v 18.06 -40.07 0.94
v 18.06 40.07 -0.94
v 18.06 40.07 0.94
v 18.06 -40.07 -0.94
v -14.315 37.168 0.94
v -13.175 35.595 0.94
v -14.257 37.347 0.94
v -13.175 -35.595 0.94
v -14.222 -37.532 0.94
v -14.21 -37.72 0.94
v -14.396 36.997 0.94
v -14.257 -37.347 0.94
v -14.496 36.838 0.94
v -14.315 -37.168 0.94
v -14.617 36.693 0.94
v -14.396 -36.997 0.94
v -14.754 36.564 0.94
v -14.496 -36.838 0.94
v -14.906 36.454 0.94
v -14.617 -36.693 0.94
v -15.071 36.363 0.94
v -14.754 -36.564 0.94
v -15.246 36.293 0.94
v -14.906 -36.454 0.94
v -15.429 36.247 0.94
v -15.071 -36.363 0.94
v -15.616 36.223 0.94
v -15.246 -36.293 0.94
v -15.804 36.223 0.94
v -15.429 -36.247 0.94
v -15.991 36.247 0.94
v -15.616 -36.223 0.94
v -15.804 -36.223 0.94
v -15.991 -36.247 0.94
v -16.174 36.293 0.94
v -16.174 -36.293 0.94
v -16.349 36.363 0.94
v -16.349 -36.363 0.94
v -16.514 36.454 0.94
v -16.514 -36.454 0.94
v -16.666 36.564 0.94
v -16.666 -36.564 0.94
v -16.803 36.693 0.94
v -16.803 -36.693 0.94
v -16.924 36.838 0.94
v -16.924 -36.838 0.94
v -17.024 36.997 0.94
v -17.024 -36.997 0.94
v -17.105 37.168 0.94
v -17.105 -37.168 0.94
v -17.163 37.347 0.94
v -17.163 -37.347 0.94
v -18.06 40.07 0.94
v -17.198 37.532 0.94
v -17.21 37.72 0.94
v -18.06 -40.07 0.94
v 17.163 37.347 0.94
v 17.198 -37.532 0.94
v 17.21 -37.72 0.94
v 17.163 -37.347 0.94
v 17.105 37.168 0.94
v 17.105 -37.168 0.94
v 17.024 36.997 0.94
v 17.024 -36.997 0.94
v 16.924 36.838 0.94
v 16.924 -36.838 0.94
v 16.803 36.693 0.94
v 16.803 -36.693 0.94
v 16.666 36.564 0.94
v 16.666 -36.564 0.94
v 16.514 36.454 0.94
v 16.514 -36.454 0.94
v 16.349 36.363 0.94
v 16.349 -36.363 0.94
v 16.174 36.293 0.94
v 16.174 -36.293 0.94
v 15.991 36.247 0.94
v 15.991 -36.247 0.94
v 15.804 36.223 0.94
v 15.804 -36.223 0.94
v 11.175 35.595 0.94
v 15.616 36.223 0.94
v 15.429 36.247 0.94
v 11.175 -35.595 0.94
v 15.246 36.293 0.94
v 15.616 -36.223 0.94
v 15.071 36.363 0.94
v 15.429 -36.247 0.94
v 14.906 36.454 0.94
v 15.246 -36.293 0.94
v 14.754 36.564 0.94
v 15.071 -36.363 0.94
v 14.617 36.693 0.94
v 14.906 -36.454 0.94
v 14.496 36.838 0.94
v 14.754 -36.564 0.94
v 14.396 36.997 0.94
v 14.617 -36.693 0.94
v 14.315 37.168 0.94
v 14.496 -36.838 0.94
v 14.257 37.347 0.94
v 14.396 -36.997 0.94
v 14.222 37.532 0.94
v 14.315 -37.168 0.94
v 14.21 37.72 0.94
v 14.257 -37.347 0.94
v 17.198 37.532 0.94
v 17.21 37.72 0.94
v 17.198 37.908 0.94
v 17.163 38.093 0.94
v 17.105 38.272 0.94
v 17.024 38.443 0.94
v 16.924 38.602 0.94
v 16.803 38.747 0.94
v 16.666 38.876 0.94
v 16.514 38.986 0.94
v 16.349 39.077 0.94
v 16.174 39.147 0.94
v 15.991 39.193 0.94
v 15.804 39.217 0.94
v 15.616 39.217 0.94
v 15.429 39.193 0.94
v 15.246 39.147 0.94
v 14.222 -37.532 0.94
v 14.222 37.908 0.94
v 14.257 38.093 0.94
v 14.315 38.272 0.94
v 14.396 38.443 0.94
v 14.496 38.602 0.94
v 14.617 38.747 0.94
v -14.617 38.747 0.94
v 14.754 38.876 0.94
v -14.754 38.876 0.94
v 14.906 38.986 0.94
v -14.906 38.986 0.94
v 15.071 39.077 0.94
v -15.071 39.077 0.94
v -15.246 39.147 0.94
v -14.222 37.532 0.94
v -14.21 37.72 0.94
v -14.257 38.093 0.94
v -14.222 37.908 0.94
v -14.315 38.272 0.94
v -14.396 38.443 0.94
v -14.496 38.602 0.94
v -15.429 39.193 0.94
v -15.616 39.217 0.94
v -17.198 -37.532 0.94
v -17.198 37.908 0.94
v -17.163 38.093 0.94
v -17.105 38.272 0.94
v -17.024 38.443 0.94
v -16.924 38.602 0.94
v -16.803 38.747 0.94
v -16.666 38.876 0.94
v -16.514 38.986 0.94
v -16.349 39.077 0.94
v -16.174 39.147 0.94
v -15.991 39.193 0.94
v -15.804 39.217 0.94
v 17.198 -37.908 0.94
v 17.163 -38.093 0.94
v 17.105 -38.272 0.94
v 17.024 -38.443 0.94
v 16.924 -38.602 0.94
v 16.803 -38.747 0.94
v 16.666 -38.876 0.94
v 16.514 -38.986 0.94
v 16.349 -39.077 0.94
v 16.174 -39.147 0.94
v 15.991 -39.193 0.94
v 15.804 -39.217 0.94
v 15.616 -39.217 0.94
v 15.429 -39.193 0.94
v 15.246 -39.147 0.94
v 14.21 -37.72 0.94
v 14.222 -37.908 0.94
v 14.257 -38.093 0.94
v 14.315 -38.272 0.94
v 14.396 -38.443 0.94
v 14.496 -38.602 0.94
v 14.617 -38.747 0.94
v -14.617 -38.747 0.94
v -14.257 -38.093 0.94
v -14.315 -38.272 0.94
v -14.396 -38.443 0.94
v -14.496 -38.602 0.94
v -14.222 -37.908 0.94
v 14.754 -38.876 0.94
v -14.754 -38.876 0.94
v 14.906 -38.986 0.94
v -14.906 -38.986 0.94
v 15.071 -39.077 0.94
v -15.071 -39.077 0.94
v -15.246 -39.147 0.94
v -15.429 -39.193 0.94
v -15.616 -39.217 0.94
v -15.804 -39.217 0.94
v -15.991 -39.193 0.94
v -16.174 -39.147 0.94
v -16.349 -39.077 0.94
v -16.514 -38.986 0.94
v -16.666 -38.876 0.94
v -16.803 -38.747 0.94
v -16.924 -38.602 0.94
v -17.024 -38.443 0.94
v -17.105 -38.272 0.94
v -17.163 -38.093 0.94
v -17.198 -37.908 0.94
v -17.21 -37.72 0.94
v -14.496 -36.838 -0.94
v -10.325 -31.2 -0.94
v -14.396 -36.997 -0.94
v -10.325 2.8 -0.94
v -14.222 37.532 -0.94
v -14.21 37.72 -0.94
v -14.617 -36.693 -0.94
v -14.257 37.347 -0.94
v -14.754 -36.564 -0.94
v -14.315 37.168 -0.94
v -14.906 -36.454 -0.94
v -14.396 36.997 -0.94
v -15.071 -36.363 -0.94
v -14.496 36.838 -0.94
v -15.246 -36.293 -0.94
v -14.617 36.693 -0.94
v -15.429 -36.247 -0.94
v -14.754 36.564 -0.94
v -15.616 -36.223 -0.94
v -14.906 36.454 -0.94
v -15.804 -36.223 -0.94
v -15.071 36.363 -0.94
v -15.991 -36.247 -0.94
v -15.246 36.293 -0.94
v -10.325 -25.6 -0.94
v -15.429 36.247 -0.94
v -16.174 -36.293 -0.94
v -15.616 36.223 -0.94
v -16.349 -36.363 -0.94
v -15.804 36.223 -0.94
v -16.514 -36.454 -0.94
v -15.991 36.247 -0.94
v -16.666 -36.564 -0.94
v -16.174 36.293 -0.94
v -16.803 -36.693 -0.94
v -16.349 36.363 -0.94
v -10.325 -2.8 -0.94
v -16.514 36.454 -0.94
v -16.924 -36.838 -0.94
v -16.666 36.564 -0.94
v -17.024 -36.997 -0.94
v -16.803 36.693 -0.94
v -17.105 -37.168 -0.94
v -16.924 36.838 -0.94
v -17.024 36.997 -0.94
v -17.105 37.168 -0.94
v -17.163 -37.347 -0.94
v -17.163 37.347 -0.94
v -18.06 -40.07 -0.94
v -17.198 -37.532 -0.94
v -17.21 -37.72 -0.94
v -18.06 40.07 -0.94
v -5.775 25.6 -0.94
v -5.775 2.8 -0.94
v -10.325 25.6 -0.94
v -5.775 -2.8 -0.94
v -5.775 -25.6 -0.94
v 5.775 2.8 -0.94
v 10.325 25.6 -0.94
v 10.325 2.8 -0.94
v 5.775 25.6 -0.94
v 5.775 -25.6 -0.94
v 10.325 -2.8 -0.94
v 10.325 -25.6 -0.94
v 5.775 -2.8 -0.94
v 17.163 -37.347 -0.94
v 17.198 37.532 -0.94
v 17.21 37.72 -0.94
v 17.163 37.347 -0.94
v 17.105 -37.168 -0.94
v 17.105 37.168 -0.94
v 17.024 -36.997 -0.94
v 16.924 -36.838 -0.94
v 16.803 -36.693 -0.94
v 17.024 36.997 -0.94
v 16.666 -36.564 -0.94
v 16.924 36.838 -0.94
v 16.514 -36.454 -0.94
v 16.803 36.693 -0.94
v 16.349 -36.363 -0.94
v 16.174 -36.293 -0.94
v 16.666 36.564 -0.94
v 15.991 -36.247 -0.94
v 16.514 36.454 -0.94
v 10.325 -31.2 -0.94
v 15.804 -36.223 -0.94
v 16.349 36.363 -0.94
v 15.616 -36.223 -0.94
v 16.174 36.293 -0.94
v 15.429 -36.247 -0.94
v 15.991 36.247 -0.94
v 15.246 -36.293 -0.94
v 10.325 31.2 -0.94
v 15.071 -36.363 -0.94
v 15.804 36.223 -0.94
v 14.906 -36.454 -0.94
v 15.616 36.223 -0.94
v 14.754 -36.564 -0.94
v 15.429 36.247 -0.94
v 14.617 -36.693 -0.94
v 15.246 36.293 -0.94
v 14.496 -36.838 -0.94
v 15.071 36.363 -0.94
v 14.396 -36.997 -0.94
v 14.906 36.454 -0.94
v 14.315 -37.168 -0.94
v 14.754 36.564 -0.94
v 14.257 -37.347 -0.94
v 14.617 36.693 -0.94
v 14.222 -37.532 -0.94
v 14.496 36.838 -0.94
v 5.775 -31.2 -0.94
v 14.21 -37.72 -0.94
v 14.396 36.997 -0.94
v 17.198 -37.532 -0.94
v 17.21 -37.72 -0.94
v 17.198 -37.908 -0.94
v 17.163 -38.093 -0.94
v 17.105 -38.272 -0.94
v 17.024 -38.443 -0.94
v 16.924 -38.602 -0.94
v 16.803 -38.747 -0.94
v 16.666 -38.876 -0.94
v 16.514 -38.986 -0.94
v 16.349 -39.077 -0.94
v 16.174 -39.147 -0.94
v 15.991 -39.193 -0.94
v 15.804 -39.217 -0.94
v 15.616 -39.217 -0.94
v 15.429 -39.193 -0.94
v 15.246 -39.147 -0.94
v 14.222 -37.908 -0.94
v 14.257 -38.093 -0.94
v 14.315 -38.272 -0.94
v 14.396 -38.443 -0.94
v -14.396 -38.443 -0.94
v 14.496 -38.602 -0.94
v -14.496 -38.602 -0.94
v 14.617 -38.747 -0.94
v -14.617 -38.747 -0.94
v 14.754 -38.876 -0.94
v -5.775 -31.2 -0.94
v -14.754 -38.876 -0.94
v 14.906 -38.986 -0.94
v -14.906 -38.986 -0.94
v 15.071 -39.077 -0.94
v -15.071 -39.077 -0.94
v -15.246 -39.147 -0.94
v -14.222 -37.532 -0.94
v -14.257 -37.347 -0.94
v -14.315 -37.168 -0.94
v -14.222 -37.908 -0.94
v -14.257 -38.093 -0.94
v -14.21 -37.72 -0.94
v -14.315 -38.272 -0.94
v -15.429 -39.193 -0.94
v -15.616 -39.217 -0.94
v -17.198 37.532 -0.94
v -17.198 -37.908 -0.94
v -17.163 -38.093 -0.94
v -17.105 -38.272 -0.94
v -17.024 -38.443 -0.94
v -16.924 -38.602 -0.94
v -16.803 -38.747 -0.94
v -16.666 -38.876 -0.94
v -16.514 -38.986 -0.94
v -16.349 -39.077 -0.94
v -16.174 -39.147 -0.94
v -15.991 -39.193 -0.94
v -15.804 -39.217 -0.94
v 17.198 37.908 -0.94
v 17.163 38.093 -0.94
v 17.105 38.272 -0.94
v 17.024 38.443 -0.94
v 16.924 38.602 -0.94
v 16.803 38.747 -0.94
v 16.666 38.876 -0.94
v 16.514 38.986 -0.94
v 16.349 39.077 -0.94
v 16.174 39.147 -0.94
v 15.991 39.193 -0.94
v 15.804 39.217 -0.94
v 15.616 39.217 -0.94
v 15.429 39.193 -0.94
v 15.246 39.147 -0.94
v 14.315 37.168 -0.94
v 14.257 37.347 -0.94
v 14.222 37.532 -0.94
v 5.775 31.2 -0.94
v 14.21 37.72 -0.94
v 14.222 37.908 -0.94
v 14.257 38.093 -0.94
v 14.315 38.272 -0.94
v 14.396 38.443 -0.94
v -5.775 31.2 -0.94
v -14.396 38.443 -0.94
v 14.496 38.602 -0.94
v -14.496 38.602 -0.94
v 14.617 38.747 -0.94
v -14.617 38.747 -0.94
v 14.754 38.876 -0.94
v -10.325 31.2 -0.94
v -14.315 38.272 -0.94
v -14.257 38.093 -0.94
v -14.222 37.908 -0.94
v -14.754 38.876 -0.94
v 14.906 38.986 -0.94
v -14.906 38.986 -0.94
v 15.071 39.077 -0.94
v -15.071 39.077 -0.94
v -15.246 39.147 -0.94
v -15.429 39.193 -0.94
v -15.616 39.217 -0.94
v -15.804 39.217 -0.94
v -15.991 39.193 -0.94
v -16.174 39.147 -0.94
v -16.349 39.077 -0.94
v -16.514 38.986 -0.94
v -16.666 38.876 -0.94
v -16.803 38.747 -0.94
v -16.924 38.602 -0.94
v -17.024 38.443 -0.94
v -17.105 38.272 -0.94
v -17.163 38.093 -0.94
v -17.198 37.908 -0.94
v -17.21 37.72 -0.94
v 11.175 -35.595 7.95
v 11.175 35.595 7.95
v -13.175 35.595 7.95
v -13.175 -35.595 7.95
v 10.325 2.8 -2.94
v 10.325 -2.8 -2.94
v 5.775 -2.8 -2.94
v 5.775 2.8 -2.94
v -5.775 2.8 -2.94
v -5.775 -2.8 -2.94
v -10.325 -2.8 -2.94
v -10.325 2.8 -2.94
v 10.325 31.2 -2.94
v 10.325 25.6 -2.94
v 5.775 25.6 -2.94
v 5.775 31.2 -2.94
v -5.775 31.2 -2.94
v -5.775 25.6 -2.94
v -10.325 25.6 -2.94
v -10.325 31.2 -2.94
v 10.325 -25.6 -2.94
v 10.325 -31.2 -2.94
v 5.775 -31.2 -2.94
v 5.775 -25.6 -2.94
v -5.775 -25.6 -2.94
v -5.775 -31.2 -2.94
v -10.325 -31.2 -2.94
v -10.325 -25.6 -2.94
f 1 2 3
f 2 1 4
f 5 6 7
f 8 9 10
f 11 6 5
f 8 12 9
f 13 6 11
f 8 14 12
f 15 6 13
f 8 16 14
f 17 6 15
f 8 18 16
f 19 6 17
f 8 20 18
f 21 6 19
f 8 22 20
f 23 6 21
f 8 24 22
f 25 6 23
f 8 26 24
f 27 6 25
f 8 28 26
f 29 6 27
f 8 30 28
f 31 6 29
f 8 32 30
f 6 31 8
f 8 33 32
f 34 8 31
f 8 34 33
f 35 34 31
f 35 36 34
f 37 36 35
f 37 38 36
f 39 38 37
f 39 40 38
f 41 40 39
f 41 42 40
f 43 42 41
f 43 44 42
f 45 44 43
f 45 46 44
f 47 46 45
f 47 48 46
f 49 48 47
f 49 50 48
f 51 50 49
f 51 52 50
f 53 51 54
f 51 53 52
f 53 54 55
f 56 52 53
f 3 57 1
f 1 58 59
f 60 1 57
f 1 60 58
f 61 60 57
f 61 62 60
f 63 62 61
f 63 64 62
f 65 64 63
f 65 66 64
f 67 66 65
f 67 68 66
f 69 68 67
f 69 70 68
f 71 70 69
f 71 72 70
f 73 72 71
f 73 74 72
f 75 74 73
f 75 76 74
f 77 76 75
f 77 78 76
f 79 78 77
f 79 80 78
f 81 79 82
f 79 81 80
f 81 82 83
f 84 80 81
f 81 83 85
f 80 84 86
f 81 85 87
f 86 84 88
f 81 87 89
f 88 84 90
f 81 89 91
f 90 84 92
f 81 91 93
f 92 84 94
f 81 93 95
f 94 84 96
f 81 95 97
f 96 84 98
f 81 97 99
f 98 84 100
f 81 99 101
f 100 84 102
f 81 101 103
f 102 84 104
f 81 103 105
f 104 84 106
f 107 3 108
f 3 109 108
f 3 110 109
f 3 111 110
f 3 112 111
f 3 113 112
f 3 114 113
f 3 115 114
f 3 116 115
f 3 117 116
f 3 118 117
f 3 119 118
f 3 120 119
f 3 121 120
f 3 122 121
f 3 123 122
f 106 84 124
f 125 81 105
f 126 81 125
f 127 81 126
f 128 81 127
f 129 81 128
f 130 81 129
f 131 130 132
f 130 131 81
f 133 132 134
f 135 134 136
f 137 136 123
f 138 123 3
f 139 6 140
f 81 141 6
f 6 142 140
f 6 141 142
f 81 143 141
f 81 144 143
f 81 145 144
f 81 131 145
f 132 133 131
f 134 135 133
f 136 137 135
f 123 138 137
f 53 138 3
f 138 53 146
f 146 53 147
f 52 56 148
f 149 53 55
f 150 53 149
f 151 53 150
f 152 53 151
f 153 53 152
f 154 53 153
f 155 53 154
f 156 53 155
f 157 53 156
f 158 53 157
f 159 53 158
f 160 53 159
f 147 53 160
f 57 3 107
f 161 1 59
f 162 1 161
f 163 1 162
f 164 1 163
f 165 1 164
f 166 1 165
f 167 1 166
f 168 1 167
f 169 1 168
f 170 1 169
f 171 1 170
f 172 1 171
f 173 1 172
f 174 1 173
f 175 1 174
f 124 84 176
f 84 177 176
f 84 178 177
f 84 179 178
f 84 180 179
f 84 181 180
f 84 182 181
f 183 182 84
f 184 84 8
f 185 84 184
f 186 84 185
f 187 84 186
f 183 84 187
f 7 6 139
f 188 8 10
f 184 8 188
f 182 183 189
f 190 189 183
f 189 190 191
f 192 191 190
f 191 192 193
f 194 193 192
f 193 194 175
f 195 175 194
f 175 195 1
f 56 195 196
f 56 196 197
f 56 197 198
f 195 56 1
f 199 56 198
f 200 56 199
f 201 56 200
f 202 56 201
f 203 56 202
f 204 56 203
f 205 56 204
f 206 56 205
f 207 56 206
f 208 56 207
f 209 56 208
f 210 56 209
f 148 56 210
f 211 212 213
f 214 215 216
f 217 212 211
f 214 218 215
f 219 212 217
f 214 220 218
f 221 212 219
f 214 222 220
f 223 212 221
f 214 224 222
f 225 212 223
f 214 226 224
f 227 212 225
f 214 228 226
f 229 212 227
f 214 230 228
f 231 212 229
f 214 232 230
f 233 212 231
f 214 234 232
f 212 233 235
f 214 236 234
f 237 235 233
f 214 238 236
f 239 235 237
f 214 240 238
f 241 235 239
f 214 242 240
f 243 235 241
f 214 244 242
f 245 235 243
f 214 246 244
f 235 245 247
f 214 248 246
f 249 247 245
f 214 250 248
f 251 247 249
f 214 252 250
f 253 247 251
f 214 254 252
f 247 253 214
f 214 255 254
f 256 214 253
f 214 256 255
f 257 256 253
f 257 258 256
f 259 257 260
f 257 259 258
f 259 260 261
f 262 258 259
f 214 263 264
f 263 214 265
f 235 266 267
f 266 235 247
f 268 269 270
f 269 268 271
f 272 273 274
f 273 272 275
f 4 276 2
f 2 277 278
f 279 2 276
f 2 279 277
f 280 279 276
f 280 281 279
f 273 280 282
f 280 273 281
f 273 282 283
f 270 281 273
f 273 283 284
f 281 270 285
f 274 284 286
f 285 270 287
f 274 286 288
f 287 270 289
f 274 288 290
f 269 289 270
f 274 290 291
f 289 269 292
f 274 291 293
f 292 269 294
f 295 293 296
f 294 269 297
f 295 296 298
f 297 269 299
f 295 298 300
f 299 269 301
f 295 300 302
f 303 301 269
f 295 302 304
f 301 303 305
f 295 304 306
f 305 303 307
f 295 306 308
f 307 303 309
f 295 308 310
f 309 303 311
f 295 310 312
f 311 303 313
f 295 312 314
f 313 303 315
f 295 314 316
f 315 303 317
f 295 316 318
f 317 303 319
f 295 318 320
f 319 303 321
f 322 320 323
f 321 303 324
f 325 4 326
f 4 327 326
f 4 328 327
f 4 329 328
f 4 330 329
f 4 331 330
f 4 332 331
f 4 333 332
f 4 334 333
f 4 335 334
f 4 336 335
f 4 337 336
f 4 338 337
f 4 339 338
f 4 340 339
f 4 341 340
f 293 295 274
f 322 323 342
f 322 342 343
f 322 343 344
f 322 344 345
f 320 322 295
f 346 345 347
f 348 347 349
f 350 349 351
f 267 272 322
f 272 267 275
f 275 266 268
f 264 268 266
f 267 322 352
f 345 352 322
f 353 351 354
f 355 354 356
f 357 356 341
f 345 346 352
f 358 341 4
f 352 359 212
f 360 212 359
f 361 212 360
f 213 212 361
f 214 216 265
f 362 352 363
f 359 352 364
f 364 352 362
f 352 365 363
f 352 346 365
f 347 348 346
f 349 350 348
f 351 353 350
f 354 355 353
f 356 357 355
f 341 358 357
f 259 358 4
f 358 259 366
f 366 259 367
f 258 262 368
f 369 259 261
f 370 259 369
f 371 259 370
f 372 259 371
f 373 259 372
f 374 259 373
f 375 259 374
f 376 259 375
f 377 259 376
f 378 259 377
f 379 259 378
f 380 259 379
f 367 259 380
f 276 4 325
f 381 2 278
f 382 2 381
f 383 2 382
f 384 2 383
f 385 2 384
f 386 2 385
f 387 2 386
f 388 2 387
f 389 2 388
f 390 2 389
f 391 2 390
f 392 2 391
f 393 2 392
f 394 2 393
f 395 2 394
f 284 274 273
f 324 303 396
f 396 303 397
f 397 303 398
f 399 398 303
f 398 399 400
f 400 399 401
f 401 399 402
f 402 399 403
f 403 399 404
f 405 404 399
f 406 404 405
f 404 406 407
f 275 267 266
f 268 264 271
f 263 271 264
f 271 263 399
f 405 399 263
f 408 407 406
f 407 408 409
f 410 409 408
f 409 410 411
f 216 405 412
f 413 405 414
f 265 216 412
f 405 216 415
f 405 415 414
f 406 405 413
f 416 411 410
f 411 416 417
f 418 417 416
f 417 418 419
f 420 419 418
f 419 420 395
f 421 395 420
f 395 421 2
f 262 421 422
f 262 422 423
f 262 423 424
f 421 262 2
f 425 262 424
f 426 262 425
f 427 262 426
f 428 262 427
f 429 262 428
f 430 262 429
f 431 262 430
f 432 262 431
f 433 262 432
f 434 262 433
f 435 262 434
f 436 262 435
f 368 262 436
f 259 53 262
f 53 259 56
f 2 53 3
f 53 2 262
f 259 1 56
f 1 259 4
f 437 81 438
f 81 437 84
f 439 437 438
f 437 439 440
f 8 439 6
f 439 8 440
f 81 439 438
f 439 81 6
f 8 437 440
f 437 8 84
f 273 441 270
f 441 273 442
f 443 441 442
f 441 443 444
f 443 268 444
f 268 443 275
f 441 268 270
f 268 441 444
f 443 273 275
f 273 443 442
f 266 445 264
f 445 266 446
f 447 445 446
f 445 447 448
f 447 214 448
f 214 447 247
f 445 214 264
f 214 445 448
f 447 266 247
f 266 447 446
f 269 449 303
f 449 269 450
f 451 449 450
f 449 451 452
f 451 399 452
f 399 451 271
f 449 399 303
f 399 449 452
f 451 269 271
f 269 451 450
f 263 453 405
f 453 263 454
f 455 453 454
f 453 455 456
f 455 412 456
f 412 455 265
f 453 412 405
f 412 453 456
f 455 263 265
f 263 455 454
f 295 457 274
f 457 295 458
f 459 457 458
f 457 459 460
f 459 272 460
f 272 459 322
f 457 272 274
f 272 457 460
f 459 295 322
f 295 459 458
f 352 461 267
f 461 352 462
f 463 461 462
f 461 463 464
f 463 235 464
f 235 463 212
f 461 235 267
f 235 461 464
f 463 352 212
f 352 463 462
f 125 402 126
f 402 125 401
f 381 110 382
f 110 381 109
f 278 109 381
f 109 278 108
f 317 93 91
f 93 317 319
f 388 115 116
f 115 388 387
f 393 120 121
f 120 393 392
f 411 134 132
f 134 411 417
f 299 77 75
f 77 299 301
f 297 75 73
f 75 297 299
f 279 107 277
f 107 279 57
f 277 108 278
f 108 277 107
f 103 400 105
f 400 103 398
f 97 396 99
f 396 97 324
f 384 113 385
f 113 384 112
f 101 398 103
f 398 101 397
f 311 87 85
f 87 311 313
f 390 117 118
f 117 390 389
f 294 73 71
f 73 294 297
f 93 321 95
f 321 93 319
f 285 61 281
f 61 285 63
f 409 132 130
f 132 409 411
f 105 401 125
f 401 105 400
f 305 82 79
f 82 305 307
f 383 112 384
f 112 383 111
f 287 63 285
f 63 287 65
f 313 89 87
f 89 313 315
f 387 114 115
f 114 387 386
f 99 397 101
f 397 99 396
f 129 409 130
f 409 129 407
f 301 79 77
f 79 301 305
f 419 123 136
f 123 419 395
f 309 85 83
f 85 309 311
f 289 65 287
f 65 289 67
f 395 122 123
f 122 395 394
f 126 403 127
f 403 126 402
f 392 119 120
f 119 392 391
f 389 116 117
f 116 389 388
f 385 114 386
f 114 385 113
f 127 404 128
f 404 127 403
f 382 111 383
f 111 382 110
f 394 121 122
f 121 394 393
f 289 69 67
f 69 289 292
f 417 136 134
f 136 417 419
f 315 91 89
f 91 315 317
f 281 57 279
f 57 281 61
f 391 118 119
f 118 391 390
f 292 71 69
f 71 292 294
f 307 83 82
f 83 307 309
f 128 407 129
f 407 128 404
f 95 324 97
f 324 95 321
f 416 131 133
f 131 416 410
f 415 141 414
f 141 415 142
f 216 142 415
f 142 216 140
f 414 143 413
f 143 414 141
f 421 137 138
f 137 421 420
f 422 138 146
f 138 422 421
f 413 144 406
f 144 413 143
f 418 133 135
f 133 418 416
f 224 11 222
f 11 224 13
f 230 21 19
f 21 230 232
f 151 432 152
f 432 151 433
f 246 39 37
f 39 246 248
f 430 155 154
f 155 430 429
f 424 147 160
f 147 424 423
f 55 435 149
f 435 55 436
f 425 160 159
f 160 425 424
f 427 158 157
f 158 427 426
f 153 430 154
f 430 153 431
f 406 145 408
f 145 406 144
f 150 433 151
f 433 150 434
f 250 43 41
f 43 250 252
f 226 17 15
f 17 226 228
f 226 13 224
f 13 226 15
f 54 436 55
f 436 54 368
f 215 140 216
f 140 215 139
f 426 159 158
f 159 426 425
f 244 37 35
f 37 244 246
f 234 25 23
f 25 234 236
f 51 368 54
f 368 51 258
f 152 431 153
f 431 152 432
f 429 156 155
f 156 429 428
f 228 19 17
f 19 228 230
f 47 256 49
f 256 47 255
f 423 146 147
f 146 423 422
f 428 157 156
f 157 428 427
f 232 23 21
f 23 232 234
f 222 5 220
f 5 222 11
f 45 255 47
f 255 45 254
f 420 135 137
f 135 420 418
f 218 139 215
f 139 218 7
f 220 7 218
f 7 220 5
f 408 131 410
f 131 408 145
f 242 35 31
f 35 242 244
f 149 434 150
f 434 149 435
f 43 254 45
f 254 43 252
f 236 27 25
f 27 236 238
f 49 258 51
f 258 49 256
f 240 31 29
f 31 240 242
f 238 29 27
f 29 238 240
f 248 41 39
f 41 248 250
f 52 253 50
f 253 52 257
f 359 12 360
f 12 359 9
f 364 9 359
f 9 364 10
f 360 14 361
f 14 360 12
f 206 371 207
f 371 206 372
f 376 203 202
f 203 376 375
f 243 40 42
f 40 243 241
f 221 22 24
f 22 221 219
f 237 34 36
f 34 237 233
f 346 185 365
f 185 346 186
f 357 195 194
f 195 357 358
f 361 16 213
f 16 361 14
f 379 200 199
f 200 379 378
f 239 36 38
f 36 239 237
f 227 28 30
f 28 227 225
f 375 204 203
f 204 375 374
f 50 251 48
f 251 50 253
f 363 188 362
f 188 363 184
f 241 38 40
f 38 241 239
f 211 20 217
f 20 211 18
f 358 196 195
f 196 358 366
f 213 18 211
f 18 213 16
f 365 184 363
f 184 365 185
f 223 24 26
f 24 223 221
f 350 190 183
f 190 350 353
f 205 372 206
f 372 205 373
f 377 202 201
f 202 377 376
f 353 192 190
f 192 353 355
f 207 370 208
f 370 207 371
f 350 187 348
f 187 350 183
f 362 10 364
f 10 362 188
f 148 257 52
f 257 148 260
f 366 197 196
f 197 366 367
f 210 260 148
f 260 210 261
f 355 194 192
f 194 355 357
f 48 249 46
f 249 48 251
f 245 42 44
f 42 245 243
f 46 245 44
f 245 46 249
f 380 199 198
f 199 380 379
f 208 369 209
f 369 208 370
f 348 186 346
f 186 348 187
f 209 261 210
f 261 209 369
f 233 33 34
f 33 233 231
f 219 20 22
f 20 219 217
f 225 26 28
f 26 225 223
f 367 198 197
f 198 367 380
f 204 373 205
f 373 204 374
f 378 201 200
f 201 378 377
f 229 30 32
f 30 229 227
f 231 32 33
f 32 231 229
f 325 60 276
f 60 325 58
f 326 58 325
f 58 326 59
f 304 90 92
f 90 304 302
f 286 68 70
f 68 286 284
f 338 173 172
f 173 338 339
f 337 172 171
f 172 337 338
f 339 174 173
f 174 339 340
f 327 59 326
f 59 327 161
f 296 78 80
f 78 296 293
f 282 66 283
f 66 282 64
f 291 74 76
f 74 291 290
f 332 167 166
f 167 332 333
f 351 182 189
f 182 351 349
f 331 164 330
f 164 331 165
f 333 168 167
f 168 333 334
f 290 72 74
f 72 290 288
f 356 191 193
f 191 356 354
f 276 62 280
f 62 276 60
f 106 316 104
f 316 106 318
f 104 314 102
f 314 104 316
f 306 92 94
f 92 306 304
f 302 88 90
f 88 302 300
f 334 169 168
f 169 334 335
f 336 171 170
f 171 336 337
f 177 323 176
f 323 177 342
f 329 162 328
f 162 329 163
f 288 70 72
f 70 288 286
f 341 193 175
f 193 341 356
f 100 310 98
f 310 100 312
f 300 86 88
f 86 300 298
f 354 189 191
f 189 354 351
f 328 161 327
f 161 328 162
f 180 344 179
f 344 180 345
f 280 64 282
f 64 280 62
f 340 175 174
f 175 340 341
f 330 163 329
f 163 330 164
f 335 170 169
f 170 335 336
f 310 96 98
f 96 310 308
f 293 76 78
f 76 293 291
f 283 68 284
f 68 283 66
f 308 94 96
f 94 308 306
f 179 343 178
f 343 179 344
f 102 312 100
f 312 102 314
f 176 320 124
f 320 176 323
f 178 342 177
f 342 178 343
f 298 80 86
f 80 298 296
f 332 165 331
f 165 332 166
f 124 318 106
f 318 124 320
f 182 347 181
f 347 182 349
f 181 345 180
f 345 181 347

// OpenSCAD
//making a model of the 16x2 lcd screen



module lcd_crystal() {

	x_pcb = 36.12;
	y_pcb = 80.14;
	z_pcb = 1.88;

	x_screen = 24.35;
	y_screen = 71.19;
	z_screen = 7.01;

	difference(){
		union(){
			//additions

			//pcb
			color("darkgreen") cube(size=[x_pcb, y_pcb, z_pcb], center=true);

			//screen
			translate([-1,0,(z_pcb + z_screen)/2]) color("black") cube( size=[x_screen, y_screen, z_screen], center=true);

			//tread on bottom
			translate([12.6 - 4.55, 0, -(z_pcb+2)/2]) color("black") cube(size=[4.55, 5.6, 2], center=true);
			translate([-(12.6 - 4.55), 0, -(z_pcb+2)/2]) color("black") cube(size=[4.55, 5.6, 2], center=true);
			translate([12.6 - 4.55, 28.4, -(z_pcb+2)/2]) color("black") cube(size=[4.55, 5.6, 2], center=true);
			translate([-(12.6 - 4.55), 28.4, -(z_pcb+2)/2]) color("black") cube(size=[4.55, 5.6, 2], center=true);
			translate([12.6 - 4.55, -28.4, -(z_pcb+2)/2]) color("black") cube(size=[4.55, 5.6, 2], center=true);
			translate([-(12.6 - 4.55), -28.4, -(z_pcb+2)/2]) color("black") cube(size=[4.55, 5.6, 2], center=true);

		}

		union(){
			//subtractions

			//mounting holes
			translate([x_pcb/2 - 2.35, y_pcb/2 - 2.35, 0]) cylinder(h=3, r=1.5, center=true, $fn=50);
			translate([-(x_pcb/2 - 2.35), y_pcb/2 - 2.35, 0]) cylinder(h=3, r=1.5, center=true, $fn=50);
			translate([-(x_pcb/2 - 2.35), -(y_pcb/2 - 2.35), 0]) cylinder(h=3, r=1.5, center=true, $fn=50);
			translate([x_pcb/2 - 2.35, -(y_pcb/2 - 2.35), 0]) cylinder(h=3, r=1.5, center=true, $fn=50);
		}
	}
}

lcd_crystal();
